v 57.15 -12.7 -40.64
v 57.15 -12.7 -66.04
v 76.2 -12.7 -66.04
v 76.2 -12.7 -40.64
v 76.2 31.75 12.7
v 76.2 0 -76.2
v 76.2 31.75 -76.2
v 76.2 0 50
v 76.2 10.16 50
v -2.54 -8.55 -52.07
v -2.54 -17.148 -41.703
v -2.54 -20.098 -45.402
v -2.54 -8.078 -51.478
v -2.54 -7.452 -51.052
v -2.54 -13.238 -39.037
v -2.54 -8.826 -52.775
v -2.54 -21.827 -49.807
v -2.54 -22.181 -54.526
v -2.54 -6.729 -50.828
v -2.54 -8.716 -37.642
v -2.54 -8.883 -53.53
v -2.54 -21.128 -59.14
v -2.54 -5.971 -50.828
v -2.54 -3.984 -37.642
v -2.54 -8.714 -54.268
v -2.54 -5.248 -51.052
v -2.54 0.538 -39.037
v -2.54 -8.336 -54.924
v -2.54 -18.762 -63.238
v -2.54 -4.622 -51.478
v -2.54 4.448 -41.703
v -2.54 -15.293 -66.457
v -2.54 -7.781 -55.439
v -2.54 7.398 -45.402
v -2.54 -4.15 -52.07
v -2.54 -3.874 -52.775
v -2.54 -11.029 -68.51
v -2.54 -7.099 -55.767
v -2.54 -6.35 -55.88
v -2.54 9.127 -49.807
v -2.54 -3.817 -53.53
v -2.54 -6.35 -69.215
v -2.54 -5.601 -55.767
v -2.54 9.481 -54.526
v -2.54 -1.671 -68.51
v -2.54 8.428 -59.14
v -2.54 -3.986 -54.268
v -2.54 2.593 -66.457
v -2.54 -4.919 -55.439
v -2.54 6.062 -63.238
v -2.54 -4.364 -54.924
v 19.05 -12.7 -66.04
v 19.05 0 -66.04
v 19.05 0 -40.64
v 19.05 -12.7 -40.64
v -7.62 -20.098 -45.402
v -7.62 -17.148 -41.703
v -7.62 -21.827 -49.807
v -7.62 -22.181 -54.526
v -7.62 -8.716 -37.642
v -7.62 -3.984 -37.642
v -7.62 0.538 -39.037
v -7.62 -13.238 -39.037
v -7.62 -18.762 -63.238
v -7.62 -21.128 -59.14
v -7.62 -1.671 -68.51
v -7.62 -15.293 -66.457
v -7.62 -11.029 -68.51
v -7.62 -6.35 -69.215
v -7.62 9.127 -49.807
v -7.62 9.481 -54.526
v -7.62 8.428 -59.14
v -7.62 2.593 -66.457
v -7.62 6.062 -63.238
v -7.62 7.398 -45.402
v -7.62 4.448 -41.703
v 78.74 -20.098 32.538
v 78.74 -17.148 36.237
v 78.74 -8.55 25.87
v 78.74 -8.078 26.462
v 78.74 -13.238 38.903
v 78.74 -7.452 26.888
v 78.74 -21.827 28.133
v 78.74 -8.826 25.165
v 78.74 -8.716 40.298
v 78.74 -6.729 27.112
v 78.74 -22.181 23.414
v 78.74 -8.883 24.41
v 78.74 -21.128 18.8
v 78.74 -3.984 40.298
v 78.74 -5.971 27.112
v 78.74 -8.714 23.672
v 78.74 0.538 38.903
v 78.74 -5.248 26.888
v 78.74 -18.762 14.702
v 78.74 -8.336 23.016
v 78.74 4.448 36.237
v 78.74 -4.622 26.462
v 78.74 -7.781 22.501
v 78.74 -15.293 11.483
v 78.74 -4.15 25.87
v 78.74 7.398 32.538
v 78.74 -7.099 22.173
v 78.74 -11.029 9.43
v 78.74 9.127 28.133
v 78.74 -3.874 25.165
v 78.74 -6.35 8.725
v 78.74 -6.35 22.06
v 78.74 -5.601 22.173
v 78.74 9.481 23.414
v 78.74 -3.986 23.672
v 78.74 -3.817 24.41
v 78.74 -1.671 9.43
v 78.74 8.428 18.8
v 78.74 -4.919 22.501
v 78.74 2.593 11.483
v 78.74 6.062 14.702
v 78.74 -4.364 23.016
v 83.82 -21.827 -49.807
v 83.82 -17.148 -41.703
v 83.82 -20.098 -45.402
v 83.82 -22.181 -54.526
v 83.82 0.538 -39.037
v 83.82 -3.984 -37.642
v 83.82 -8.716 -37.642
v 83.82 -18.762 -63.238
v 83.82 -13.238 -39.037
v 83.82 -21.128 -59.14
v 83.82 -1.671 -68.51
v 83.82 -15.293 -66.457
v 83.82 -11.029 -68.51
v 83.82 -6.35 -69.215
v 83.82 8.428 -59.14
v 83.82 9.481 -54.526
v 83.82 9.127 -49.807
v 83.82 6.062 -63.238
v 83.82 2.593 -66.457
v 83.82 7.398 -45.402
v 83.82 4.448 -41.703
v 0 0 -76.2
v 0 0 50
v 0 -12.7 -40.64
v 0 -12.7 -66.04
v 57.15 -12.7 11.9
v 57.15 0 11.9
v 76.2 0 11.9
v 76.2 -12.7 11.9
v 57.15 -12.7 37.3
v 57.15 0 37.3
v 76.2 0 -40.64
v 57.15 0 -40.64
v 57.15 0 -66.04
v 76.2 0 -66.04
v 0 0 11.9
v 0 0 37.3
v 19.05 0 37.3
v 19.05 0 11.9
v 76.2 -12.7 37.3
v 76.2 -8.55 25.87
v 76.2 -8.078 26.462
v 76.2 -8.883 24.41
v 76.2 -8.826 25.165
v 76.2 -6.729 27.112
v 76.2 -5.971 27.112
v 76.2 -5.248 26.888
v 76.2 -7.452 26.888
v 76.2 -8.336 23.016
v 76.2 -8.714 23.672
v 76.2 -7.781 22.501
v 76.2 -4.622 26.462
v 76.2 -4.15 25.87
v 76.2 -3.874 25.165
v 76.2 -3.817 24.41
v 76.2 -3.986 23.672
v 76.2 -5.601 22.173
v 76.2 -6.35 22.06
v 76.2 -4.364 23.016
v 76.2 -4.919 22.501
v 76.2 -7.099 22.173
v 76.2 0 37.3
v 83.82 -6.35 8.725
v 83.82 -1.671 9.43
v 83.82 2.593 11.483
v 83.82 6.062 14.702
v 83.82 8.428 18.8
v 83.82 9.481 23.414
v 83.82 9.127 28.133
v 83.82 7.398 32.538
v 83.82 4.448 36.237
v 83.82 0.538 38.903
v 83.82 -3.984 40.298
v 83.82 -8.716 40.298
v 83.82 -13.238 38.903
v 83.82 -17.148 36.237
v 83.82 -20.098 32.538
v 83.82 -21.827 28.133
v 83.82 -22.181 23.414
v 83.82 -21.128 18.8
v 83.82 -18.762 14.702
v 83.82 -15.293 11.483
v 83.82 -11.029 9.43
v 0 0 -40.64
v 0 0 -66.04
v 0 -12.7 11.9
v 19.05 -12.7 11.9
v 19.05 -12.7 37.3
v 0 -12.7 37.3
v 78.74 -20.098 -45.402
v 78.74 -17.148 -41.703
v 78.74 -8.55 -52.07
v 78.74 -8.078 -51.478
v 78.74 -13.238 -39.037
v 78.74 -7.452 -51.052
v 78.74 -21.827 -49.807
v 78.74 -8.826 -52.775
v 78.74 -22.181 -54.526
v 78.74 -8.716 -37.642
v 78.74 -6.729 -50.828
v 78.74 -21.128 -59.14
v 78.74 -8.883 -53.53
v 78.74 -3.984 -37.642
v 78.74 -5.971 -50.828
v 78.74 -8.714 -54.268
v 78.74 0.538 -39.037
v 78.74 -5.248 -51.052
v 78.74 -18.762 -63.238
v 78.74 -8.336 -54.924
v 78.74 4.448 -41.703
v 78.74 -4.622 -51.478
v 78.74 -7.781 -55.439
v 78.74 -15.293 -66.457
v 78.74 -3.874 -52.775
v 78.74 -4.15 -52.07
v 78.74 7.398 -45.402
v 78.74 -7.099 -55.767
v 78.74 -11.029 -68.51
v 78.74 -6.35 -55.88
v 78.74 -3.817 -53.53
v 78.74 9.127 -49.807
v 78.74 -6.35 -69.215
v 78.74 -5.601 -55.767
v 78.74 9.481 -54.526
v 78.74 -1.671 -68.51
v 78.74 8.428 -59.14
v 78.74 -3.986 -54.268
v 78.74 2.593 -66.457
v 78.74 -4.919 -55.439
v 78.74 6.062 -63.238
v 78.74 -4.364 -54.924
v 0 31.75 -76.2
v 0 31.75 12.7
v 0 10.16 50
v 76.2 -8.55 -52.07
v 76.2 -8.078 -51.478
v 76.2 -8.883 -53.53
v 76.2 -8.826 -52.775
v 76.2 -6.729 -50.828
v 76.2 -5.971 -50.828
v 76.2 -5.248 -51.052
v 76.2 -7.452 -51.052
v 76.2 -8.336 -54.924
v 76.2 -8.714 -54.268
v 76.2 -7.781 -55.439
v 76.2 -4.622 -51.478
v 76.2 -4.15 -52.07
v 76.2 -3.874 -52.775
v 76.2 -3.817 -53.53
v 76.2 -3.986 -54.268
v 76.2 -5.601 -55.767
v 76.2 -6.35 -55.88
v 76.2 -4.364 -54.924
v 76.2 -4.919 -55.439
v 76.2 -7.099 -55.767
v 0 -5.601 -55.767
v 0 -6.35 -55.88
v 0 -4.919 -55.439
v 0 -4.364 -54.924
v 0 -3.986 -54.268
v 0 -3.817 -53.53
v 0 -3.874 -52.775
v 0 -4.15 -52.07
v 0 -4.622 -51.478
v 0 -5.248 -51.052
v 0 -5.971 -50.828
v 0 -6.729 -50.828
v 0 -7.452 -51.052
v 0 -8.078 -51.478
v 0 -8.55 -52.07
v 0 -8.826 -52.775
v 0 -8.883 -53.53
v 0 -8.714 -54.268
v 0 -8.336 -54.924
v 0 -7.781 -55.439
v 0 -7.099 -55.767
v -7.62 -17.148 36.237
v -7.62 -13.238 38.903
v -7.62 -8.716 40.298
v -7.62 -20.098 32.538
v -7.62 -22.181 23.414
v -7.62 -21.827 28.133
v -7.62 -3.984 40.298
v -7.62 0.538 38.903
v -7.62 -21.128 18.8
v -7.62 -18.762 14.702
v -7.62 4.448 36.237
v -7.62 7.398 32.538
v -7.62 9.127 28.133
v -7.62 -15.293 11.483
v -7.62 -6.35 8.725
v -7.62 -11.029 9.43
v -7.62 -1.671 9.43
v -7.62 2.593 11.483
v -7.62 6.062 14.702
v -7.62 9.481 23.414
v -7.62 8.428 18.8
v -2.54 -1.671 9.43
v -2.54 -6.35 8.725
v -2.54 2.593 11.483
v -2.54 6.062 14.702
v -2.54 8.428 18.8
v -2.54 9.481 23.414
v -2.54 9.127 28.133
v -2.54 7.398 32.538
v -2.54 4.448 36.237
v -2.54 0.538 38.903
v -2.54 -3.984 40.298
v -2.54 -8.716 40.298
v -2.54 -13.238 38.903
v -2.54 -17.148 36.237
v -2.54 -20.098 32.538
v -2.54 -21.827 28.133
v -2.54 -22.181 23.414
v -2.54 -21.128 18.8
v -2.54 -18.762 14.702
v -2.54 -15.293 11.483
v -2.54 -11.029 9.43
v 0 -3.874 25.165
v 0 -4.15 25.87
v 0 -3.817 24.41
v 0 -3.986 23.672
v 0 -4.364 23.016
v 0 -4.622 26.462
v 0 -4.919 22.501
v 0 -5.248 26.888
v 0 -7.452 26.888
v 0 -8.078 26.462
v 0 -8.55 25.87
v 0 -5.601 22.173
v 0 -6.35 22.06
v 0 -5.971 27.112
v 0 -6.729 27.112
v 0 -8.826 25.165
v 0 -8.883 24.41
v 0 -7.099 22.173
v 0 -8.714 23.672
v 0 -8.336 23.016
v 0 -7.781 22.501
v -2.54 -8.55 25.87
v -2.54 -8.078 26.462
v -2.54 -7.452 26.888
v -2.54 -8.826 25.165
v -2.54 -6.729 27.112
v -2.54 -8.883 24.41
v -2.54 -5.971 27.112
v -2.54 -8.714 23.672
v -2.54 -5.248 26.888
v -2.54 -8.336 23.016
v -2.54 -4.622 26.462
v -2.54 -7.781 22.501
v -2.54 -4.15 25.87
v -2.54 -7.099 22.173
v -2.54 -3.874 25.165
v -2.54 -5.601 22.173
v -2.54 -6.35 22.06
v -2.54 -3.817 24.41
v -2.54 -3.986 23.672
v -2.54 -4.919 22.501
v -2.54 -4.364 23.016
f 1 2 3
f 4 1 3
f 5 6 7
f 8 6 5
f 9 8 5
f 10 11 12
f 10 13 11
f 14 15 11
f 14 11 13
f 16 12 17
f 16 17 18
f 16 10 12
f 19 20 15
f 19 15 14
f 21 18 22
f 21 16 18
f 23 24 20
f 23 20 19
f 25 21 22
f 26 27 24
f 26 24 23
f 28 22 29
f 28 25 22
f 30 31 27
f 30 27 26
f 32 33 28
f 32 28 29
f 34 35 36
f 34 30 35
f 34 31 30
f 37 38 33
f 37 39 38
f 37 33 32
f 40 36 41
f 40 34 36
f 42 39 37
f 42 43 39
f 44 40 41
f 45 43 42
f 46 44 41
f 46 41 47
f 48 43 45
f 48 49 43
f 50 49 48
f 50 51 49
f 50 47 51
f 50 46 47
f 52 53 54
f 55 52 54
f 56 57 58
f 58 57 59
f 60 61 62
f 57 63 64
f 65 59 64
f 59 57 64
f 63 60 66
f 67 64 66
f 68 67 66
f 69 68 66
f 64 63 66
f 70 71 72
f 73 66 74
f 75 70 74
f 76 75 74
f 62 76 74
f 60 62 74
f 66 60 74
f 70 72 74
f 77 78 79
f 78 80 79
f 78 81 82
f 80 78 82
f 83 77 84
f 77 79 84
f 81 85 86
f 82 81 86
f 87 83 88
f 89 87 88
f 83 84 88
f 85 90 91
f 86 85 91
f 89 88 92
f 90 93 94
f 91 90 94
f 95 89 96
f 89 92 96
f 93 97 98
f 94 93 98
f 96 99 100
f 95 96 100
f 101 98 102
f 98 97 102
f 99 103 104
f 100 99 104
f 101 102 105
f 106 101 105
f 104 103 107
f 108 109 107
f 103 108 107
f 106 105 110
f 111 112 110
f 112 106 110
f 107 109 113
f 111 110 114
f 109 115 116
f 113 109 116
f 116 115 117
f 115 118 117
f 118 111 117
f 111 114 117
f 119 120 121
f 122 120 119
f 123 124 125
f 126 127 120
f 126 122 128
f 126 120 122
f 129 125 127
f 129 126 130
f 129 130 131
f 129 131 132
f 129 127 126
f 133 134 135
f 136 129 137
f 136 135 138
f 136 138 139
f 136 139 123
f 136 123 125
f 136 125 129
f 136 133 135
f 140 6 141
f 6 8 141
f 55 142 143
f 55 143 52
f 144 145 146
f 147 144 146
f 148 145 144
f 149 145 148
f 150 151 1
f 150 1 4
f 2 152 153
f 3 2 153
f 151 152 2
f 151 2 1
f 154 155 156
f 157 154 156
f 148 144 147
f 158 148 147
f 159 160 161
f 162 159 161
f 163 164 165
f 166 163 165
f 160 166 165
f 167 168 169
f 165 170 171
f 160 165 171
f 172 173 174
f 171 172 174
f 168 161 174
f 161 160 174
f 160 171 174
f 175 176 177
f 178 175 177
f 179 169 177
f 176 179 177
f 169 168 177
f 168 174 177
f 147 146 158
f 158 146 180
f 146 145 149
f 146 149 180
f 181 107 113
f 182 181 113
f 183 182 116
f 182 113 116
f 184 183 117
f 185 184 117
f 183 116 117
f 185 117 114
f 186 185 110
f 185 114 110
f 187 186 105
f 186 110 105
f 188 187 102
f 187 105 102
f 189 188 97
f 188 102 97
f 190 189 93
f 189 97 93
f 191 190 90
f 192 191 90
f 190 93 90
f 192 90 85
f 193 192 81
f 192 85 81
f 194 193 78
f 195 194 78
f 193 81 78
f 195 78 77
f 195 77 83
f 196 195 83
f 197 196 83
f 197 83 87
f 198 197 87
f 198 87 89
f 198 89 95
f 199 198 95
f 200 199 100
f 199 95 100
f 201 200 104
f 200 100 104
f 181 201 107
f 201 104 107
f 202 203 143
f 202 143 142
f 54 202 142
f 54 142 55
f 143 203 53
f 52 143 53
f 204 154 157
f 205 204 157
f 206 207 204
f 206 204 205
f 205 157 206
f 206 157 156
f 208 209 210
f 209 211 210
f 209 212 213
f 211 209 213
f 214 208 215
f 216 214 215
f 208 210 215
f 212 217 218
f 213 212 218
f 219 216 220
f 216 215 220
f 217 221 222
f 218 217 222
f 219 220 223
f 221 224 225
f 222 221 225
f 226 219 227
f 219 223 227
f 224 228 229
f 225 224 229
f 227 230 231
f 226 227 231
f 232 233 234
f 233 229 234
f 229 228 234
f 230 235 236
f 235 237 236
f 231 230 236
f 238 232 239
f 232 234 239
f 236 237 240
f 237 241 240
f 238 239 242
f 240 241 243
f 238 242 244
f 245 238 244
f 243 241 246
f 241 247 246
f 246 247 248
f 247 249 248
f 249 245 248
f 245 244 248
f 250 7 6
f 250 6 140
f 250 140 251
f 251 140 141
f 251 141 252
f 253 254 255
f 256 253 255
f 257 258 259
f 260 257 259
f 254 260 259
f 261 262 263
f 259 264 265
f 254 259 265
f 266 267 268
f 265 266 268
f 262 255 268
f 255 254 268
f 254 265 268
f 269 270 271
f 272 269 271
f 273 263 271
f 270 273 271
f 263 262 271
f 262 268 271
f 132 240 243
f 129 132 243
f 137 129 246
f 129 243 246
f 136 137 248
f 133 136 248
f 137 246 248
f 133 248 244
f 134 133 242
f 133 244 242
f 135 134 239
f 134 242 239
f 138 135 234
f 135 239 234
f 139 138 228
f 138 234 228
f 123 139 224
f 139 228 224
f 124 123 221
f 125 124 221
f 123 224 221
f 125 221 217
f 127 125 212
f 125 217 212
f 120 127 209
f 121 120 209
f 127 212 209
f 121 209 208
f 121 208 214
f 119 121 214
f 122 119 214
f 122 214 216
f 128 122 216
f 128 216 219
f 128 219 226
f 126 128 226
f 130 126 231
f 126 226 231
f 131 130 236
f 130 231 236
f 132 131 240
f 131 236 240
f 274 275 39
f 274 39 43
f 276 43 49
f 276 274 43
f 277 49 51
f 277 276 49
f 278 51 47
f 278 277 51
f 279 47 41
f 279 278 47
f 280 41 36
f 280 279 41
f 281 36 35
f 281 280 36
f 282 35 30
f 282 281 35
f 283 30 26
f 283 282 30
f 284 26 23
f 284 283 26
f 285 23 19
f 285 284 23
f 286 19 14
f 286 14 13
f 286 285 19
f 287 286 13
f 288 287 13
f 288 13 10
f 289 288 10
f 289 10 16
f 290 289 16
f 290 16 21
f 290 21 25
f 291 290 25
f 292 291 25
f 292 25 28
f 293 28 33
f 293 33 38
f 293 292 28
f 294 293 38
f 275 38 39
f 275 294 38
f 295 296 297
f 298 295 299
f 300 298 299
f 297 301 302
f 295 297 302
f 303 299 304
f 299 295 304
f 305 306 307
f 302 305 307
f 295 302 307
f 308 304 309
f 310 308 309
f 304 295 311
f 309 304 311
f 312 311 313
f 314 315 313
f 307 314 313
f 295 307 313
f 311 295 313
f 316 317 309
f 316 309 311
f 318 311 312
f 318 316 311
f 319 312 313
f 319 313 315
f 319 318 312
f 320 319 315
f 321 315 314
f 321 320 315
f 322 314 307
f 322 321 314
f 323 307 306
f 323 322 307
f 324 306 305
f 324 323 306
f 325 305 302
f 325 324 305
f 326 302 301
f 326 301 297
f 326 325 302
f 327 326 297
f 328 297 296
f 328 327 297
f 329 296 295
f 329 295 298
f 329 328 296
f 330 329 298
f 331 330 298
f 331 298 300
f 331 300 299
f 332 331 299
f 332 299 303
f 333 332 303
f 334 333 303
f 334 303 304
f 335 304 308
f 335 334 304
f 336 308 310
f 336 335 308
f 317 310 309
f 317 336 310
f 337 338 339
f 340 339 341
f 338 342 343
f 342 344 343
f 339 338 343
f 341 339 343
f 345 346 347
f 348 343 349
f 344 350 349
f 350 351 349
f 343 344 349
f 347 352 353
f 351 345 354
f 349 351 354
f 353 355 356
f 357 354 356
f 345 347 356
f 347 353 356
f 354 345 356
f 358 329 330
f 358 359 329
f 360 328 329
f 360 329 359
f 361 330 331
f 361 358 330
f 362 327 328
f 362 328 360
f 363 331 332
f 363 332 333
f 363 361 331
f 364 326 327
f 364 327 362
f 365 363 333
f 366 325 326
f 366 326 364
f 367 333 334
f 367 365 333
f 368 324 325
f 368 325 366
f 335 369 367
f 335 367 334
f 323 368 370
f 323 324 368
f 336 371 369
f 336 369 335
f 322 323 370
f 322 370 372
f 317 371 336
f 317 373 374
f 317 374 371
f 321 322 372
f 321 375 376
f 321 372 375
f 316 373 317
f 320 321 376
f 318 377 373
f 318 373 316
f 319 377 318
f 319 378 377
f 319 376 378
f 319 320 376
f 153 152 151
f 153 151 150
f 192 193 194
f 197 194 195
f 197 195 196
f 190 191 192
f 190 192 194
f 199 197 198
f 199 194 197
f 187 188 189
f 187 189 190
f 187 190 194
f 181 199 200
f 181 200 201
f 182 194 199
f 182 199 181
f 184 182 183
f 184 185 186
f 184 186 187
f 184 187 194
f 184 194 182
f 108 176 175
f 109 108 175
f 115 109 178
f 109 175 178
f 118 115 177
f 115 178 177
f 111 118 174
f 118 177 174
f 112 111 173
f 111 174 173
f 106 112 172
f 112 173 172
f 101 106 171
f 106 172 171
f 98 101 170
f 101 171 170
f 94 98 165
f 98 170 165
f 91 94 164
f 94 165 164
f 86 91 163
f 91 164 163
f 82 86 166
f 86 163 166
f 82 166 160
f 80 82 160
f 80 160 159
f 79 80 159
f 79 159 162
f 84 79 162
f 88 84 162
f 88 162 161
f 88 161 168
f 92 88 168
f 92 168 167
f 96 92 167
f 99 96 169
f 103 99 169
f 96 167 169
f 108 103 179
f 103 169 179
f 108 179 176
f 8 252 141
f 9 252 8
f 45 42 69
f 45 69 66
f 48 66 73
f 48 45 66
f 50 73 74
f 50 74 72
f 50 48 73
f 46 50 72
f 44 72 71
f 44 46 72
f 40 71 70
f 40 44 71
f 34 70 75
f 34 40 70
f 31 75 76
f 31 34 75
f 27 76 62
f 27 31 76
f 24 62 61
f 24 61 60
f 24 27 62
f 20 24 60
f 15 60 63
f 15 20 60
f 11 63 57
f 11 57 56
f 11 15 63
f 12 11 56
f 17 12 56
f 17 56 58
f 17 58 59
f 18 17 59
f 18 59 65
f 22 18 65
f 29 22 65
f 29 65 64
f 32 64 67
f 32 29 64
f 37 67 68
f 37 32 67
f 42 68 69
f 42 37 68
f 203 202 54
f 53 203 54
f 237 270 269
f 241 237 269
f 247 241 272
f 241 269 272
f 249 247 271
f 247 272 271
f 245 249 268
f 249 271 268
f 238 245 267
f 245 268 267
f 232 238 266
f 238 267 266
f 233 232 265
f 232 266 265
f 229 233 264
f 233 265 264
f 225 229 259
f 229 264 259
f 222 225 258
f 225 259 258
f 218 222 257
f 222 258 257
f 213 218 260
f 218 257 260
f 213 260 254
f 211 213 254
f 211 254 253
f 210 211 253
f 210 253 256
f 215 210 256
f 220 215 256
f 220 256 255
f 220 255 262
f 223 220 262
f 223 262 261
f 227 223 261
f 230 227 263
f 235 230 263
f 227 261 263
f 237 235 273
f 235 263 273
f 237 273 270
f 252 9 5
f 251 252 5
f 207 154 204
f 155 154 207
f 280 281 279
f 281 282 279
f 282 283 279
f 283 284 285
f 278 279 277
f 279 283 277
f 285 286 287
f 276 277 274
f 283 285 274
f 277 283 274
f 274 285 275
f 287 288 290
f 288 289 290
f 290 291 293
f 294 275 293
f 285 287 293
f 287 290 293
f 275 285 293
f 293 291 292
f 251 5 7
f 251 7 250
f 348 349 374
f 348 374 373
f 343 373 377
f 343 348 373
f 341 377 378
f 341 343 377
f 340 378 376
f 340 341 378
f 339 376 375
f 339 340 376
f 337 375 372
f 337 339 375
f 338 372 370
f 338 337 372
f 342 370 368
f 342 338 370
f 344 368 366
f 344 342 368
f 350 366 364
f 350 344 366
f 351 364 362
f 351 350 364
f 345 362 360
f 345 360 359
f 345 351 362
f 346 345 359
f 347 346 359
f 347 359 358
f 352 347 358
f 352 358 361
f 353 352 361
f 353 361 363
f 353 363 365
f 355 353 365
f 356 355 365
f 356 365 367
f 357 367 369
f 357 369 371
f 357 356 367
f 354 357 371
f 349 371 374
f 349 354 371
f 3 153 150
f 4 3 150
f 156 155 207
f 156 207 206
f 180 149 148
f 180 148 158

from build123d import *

# Parameters (mm, degrees)
SKETCH1_W             = 76.2
SKETCH1_H             = 31.75
BOSS_EXTRUDE1_DEPTH   = 50
CUT_EXTRUDE1_DEPTH    = 97.511670279
SKETCH3_W             = 76.2
SKETCH3_H             = 31.75
BOSS_EXTRUDE2_DEPTH   = 76.2
SKETCH4_W             = 19.05
SKETCH4_H             = 25.4
BOSS_EXTRUDE3_DEPTH   = 12.7
BOSS_EXTRUDE3_2_DEPTH = 12.7
BOSS_EXTRUDE3_3_DEPTH = 12.7
BOSS_EXTRUDE3_4_DEPTH = 12.7
SKETCH5_R             = 2.54
BOSS_EXTRUDE4_DEPTH   = 2.54
BOSS_EXTRUDE4_2_DEPTH = 2.54
SKETCH6_R             = 15.875
BOSS_EXTRUDE5_DEPTH   = 5.08


with BuildPart() as part:
    # Sketch1 → Boss-Extrude1 (new body)
    with BuildSketch(Plane.XY):
        with Locations((38.1, 15.875)):
            Rectangle(SKETCH1_W, SKETCH1_H)
    extrude(amount=BOSS_EXTRUDE1_DEPTH)

    # Sketch2 → Cut-Extrude1 (cut, through all)
    with BuildSketch(Plane(origin=(76.2, 0, 0), x_dir=(0, 0, -1), z_dir=(1, 0, 0))):
        Polygon((-50, 10.16), (-12.7, 31.75), (-50, 31.75), align=None)
    extrude(amount=-CUT_EXTRUDE1_DEPTH, mode=Mode.SUBTRACT)

    # Sketch3 → Boss-Extrude2 (add)
    with BuildSketch(Plane(origin=(0, 0, 0), x_dir=(-1, 0, 0), z_dir=(0, 0, -1))):
        with Locations((-38.1, 15.875)):
            Rectangle(SKETCH3_W, SKETCH3_H)
    extrude(amount=BOSS_EXTRUDE2_DEPTH)


with BuildPart() as body_2:
    # Sketch4 → Boss-Extrude3 (new body)
    with BuildSketch(Plane.XZ):
        with Locations((66.675, 24.6)):
            Rectangle(SKETCH4_W, SKETCH4_H)
    extrude(amount=BOSS_EXTRUDE3_DEPTH)


with BuildPart() as body_3:
    # Sketch4 → Boss-Extrude3 2 (new body)
    with BuildSketch(Plane.XZ):
        with Locations((66.675, -53.34)):
            Rectangle(SKETCH4_W, SKETCH4_H)
    extrude(amount=BOSS_EXTRUDE3_2_DEPTH)


with BuildPart() as body_4:
    # Sketch4 → Boss-Extrude3 3 (new body)
    with BuildSketch(Plane.XZ):
        with Locations((9.525, 24.6)):
            Rectangle(SKETCH4_W, SKETCH4_H)
    extrude(amount=BOSS_EXTRUDE3_3_DEPTH)


with BuildPart() as body_5:
    # Sketch4 → Boss-Extrude3 4 (new body)
    with BuildSketch(Plane.XZ):
        with Locations((9.525, -53.34)):
            Rectangle(SKETCH4_W, SKETCH4_H)
    extrude(amount=BOSS_EXTRUDE3_4_DEPTH)


with BuildPart() as body_6:
    # Sketch5 → Boss-Extrude4 (new body)
    with BuildSketch(Plane(origin=(76.2, 0, 0), x_dir=(0, 0, -1), z_dir=(1, 0, 0))):
        with Locations((-24.6, -6.35)):
            Circle(SKETCH5_R)
    boss_extrude4 = extrude(amount=BOSS_EXTRUDE4_DEPTH)



with BuildPart() as body_7:
    # Sketch5 → Boss-Extrude4 2 (new body)
    with BuildSketch(Plane(origin=(76.2, 0, 0), x_dir=(0, 0, -1), z_dir=(1, 0, 0))):
        with Locations((53.34, -6.35)):
            Circle(SKETCH5_R)
    boss_extrude4_2 = extrude(amount=BOSS_EXTRUDE4_2_DEPTH)


with BuildPart() as body_6_1:
    add(body_6.part)

    add(body_7.part)  # Boss-Extrude5 merges body 7
    # Sketch6 → Boss-Extrude5 (add)
    with BuildSketch(Plane(origin=(78.74, 0, 0), x_dir=(0, 0, -1), z_dir=(1, 0, 0))):
        with Locations((-24.6, -6.35)):
            Circle(SKETCH6_R)
        with Locations((53.34, -6.35)):
            Circle(SKETCH6_R)
    boss_extrude5 = extrude(amount=BOSS_EXTRUDE5_DEPTH)


with BuildPart() as body_4_1:
    add(body_4.part)

    add(body_5.part)  # Mirror1 merges body 5
    # Mirror1: Boss-Extrude4, Boss-Extrude4 2, Boss-Extrude5 across plane
    add(boss_extrude4.mirror(Plane(origin=(38.1, 0, 0), x_dir=(0, 0, 1), z_dir=(1, 0, 0))))
    add(boss_extrude4_2.mirror(Plane(origin=(38.1, 0, 0), x_dir=(0, 0, 1), z_dir=(1, 0, 0))))
    add(boss_extrude5.mirror(Plane(origin=(38.1, 0, 0), x_dir=(0, 0, 1), z_dir=(1, 0, 0))))


with BuildPart() as body_6_2:
    # Split1: the piece on the far side of the plane
    add(body_4_1.part)
    split(bisect_by=Plane(origin=(0, 0, 0), x_dir=(0, 0, -1), z_dir=(-1, 0, 0)), keep=Keep.BOTTOM)


with BuildPart() as body_4_2:
    add(body_4_1.part)

    # Split1
    split(bisect_by=Plane(origin=(0, 0, 0), x_dir=(0, 0, -1), z_dir=(-1, 0, 0)), keep=Keep.TOP)


solid = Compound([part.part, body_2.part, body_3.part, body_6_1.part, body_6_2.part, body_4_2.part])
